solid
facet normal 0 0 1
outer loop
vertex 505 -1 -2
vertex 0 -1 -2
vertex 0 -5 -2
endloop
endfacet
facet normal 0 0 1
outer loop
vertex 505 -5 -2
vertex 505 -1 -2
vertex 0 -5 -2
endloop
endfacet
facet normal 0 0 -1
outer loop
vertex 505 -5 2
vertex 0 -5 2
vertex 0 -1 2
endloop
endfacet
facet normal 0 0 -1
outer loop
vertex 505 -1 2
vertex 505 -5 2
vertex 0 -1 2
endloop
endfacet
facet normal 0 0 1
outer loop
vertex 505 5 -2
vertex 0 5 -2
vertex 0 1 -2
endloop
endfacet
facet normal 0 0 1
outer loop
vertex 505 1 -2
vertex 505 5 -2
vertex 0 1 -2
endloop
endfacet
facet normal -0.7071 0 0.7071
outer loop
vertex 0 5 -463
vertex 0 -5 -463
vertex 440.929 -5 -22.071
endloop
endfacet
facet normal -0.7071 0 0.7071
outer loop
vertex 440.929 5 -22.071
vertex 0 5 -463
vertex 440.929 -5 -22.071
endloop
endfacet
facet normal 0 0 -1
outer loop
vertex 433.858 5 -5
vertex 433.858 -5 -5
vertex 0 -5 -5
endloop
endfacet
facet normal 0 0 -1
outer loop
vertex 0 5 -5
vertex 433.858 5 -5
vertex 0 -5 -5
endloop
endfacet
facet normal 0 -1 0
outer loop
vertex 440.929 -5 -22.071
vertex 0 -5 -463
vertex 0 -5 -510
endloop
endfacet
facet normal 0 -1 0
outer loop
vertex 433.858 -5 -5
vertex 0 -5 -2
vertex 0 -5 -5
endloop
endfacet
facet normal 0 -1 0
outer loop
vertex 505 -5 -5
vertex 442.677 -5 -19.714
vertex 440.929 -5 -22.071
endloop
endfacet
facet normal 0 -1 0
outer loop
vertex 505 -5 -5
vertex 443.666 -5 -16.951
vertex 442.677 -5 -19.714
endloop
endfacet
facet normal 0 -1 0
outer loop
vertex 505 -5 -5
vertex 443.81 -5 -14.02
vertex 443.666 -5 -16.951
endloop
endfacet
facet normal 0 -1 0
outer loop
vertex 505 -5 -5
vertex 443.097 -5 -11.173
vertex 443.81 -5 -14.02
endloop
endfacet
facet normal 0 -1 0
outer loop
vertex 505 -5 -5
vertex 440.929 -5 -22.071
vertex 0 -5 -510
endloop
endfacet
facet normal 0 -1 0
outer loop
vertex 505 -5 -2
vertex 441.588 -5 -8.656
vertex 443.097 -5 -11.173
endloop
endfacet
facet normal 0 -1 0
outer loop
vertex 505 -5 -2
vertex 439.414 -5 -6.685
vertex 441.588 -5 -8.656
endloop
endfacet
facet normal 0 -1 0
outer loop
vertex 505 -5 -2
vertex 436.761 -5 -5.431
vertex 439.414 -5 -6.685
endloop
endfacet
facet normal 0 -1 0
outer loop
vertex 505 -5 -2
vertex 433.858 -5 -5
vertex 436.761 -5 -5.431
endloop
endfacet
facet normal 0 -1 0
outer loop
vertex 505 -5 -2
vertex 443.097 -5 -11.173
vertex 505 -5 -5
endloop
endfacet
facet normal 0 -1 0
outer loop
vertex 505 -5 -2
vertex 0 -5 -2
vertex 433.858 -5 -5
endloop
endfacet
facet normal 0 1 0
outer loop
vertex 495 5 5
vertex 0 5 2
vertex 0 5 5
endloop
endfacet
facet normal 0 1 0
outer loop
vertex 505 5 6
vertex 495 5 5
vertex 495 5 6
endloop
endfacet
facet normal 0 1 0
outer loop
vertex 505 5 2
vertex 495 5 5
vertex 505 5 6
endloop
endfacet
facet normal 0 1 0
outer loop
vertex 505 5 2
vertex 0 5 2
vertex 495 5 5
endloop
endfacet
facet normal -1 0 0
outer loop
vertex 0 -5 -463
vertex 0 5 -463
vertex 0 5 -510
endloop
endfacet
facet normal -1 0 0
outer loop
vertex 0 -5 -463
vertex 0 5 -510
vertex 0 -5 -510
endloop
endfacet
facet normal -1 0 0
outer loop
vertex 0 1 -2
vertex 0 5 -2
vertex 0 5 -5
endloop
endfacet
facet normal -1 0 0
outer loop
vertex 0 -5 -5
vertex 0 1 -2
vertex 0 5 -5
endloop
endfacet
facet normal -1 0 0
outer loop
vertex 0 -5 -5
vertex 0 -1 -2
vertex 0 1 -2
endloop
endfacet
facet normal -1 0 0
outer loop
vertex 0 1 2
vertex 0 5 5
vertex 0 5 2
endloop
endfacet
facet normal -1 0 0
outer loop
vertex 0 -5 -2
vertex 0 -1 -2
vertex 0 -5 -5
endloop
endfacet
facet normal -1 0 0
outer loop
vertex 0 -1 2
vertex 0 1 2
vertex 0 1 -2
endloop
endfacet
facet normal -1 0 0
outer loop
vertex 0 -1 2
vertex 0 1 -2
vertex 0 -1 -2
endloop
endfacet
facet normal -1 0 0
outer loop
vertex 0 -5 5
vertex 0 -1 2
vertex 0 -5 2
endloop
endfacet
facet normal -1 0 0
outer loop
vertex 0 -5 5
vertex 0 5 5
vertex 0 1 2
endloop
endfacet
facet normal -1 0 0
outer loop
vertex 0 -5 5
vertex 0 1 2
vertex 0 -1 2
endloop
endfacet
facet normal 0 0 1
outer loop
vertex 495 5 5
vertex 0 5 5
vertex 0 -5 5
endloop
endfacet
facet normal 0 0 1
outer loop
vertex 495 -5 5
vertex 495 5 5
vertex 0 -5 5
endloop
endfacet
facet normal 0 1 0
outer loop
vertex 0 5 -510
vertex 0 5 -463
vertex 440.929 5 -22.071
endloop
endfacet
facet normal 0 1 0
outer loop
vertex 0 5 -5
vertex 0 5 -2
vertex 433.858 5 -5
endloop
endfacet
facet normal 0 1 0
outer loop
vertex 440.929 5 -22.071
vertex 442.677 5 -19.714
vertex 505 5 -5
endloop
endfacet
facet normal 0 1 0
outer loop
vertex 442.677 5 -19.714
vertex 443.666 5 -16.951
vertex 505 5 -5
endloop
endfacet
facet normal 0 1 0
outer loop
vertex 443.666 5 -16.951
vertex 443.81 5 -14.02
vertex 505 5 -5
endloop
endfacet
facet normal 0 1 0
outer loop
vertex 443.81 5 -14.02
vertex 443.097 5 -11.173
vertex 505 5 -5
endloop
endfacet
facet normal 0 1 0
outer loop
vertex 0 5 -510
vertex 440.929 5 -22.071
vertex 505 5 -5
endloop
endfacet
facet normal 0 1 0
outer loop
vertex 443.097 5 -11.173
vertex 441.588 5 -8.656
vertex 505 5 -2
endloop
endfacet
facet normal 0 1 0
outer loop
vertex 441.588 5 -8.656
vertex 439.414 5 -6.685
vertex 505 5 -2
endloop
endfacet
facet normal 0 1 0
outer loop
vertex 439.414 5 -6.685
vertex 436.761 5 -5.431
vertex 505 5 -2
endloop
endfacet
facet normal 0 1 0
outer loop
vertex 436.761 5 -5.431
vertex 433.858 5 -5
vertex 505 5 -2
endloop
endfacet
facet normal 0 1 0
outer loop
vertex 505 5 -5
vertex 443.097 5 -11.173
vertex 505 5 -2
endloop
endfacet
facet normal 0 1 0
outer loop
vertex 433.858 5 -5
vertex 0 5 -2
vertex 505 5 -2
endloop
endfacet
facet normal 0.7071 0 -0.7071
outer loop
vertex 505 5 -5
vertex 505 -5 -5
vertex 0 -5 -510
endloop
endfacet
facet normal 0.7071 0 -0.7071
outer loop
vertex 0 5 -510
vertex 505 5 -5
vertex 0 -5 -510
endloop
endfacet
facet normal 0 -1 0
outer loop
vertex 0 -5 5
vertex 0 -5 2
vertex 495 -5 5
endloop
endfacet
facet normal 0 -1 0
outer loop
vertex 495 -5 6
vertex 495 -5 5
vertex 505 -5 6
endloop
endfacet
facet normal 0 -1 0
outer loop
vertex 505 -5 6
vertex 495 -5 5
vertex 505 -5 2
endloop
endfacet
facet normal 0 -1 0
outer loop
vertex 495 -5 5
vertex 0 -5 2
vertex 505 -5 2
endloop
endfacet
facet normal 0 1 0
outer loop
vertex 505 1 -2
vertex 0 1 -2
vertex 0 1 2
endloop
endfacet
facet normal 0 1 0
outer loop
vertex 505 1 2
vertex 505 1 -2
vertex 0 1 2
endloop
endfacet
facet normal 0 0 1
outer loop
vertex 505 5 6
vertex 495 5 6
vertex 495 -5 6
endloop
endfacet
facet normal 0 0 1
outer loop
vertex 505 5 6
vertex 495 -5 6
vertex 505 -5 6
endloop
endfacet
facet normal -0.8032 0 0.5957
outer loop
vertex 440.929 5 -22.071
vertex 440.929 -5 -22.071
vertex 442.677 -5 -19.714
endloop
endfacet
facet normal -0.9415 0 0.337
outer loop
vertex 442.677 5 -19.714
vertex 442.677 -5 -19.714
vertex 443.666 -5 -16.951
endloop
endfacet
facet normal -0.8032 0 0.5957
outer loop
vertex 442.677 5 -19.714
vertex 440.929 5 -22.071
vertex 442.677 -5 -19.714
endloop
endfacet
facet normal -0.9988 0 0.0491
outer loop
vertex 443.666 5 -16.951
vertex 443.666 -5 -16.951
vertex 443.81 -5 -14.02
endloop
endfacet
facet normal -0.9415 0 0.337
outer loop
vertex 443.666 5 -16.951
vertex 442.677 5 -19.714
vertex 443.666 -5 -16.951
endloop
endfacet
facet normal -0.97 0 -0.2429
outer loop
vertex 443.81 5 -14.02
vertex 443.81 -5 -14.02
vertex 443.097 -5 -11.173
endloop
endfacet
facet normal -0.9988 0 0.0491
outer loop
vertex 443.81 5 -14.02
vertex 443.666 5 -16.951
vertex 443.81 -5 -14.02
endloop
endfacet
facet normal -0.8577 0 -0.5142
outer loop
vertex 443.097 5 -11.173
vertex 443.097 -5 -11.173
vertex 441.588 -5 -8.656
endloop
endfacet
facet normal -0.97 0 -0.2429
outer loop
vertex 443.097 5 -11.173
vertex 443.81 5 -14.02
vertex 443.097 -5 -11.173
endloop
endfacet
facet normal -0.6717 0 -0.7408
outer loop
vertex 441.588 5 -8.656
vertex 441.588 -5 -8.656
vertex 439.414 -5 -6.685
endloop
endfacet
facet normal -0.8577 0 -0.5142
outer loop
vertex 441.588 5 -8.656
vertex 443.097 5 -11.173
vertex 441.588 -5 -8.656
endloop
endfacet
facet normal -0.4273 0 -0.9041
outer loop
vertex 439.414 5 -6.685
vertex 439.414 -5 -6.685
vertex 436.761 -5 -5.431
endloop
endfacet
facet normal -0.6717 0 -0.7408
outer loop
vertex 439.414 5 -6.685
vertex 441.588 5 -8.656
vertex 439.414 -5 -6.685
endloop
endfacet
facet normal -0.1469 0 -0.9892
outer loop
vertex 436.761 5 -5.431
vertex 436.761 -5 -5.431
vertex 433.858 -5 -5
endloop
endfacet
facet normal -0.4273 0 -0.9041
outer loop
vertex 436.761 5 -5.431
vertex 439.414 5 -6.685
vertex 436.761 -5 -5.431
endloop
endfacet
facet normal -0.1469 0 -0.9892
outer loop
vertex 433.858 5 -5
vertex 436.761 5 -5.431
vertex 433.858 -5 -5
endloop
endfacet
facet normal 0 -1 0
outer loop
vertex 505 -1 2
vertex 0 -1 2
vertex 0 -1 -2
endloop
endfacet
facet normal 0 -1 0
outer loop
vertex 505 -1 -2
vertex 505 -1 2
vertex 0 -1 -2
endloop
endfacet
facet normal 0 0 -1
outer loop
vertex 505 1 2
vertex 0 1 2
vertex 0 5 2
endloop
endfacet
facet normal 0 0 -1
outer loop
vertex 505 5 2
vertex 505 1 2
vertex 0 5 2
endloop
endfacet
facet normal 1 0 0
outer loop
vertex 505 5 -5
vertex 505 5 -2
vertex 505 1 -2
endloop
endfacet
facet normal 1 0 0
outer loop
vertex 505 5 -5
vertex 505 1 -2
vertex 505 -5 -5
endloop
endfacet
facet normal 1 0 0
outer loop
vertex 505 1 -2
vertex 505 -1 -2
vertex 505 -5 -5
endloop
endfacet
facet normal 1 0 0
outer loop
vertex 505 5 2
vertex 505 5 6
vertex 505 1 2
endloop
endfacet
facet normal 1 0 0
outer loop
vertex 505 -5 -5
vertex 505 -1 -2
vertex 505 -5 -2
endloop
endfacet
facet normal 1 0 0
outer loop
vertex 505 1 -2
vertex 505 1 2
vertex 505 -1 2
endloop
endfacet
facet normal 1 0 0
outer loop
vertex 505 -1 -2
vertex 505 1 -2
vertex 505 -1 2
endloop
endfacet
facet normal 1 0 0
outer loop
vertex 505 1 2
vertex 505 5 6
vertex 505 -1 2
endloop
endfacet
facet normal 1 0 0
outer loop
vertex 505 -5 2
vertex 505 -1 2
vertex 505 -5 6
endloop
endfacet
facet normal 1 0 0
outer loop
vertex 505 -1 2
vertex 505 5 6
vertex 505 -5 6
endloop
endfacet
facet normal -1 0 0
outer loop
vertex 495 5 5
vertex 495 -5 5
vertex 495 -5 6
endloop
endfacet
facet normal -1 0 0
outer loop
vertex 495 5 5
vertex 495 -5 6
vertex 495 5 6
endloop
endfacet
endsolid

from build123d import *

# Parameters (mm, degrees)
F1_DEPTH  = 505
F2_W      = 10
F2_H      = 10
F3_DEPTH  = 1
F4_W      = 505
F4_H      = 10
F5_DEPTH  = 505
F7_DEPTH  = 10.001
F8_DEPTH  = 10.001
F10_DEPTH = 10.001
F11_R     = 10


with BuildPart() as f1:
    # F0 (on Right) → F1 (new body)
    with BuildSketch(Plane.YZ):
        Polygon((-1, 2), (-1, 0), (-1, -2), (-5, -2), (-5, -5), (0, -5), (5, -5), (5, -2), (1, -2), (1, 0), (1, 2), (5, 2), (5, 5), (0, 5), (-5, 5), (-5, 2), align=None)
    extrude(amount=F1_DEPTH)

    # F2 (on face) → F3 (join)
    with BuildSketch(Plane.XY.offset(5)):
        with Locations((500, 0)):
            Rectangle(F2_W, F2_H)
    extrude(amount=F3_DEPTH)

    # F4 (on face) → F5 (join)
    with BuildSketch(Plane(origin=(0, 0, -5), x_dir=(1, 0, 0), z_dir=(0, 0, -1))):
        with Locations((252.5, 0)):
            Rectangle(F4_W, F4_H)
    extrude(amount=F5_DEPTH)

    # F6 (on face) → F7 (cut, through all)
    with BuildSketch(Plane.XZ.offset(5)):
        Polygon((0, -5), (0, -463), (458, -5), align=None)
    extrude(amount=-F7_DEPTH, mode=Mode.SUBTRACT)

    # F6 (on face) → F8 (cut, through all)
    with BuildSketch(Plane.XZ.offset(5)):
        Polygon((0, -5), (0, -463), (458, -5), align=None)
    extrude(amount=-F8_DEPTH, mode=Mode.SUBTRACT)

    # F9 (on face) → F10 (cut, through all)
    with BuildSketch(Plane.XZ.offset(5)):
        Polygon((505, -5), (0, -510), (505, -510), align=None)
    extrude(amount=-F10_DEPTH, mode=Mode.SUBTRACT)

    # F11
    f11_edges = [f1.edges().sort_by_distance(p)[0] for p in [
        (458, 0, -5),
    ]]
    fillet(f11_edges, radius=F11_R)


solid = f1.part
